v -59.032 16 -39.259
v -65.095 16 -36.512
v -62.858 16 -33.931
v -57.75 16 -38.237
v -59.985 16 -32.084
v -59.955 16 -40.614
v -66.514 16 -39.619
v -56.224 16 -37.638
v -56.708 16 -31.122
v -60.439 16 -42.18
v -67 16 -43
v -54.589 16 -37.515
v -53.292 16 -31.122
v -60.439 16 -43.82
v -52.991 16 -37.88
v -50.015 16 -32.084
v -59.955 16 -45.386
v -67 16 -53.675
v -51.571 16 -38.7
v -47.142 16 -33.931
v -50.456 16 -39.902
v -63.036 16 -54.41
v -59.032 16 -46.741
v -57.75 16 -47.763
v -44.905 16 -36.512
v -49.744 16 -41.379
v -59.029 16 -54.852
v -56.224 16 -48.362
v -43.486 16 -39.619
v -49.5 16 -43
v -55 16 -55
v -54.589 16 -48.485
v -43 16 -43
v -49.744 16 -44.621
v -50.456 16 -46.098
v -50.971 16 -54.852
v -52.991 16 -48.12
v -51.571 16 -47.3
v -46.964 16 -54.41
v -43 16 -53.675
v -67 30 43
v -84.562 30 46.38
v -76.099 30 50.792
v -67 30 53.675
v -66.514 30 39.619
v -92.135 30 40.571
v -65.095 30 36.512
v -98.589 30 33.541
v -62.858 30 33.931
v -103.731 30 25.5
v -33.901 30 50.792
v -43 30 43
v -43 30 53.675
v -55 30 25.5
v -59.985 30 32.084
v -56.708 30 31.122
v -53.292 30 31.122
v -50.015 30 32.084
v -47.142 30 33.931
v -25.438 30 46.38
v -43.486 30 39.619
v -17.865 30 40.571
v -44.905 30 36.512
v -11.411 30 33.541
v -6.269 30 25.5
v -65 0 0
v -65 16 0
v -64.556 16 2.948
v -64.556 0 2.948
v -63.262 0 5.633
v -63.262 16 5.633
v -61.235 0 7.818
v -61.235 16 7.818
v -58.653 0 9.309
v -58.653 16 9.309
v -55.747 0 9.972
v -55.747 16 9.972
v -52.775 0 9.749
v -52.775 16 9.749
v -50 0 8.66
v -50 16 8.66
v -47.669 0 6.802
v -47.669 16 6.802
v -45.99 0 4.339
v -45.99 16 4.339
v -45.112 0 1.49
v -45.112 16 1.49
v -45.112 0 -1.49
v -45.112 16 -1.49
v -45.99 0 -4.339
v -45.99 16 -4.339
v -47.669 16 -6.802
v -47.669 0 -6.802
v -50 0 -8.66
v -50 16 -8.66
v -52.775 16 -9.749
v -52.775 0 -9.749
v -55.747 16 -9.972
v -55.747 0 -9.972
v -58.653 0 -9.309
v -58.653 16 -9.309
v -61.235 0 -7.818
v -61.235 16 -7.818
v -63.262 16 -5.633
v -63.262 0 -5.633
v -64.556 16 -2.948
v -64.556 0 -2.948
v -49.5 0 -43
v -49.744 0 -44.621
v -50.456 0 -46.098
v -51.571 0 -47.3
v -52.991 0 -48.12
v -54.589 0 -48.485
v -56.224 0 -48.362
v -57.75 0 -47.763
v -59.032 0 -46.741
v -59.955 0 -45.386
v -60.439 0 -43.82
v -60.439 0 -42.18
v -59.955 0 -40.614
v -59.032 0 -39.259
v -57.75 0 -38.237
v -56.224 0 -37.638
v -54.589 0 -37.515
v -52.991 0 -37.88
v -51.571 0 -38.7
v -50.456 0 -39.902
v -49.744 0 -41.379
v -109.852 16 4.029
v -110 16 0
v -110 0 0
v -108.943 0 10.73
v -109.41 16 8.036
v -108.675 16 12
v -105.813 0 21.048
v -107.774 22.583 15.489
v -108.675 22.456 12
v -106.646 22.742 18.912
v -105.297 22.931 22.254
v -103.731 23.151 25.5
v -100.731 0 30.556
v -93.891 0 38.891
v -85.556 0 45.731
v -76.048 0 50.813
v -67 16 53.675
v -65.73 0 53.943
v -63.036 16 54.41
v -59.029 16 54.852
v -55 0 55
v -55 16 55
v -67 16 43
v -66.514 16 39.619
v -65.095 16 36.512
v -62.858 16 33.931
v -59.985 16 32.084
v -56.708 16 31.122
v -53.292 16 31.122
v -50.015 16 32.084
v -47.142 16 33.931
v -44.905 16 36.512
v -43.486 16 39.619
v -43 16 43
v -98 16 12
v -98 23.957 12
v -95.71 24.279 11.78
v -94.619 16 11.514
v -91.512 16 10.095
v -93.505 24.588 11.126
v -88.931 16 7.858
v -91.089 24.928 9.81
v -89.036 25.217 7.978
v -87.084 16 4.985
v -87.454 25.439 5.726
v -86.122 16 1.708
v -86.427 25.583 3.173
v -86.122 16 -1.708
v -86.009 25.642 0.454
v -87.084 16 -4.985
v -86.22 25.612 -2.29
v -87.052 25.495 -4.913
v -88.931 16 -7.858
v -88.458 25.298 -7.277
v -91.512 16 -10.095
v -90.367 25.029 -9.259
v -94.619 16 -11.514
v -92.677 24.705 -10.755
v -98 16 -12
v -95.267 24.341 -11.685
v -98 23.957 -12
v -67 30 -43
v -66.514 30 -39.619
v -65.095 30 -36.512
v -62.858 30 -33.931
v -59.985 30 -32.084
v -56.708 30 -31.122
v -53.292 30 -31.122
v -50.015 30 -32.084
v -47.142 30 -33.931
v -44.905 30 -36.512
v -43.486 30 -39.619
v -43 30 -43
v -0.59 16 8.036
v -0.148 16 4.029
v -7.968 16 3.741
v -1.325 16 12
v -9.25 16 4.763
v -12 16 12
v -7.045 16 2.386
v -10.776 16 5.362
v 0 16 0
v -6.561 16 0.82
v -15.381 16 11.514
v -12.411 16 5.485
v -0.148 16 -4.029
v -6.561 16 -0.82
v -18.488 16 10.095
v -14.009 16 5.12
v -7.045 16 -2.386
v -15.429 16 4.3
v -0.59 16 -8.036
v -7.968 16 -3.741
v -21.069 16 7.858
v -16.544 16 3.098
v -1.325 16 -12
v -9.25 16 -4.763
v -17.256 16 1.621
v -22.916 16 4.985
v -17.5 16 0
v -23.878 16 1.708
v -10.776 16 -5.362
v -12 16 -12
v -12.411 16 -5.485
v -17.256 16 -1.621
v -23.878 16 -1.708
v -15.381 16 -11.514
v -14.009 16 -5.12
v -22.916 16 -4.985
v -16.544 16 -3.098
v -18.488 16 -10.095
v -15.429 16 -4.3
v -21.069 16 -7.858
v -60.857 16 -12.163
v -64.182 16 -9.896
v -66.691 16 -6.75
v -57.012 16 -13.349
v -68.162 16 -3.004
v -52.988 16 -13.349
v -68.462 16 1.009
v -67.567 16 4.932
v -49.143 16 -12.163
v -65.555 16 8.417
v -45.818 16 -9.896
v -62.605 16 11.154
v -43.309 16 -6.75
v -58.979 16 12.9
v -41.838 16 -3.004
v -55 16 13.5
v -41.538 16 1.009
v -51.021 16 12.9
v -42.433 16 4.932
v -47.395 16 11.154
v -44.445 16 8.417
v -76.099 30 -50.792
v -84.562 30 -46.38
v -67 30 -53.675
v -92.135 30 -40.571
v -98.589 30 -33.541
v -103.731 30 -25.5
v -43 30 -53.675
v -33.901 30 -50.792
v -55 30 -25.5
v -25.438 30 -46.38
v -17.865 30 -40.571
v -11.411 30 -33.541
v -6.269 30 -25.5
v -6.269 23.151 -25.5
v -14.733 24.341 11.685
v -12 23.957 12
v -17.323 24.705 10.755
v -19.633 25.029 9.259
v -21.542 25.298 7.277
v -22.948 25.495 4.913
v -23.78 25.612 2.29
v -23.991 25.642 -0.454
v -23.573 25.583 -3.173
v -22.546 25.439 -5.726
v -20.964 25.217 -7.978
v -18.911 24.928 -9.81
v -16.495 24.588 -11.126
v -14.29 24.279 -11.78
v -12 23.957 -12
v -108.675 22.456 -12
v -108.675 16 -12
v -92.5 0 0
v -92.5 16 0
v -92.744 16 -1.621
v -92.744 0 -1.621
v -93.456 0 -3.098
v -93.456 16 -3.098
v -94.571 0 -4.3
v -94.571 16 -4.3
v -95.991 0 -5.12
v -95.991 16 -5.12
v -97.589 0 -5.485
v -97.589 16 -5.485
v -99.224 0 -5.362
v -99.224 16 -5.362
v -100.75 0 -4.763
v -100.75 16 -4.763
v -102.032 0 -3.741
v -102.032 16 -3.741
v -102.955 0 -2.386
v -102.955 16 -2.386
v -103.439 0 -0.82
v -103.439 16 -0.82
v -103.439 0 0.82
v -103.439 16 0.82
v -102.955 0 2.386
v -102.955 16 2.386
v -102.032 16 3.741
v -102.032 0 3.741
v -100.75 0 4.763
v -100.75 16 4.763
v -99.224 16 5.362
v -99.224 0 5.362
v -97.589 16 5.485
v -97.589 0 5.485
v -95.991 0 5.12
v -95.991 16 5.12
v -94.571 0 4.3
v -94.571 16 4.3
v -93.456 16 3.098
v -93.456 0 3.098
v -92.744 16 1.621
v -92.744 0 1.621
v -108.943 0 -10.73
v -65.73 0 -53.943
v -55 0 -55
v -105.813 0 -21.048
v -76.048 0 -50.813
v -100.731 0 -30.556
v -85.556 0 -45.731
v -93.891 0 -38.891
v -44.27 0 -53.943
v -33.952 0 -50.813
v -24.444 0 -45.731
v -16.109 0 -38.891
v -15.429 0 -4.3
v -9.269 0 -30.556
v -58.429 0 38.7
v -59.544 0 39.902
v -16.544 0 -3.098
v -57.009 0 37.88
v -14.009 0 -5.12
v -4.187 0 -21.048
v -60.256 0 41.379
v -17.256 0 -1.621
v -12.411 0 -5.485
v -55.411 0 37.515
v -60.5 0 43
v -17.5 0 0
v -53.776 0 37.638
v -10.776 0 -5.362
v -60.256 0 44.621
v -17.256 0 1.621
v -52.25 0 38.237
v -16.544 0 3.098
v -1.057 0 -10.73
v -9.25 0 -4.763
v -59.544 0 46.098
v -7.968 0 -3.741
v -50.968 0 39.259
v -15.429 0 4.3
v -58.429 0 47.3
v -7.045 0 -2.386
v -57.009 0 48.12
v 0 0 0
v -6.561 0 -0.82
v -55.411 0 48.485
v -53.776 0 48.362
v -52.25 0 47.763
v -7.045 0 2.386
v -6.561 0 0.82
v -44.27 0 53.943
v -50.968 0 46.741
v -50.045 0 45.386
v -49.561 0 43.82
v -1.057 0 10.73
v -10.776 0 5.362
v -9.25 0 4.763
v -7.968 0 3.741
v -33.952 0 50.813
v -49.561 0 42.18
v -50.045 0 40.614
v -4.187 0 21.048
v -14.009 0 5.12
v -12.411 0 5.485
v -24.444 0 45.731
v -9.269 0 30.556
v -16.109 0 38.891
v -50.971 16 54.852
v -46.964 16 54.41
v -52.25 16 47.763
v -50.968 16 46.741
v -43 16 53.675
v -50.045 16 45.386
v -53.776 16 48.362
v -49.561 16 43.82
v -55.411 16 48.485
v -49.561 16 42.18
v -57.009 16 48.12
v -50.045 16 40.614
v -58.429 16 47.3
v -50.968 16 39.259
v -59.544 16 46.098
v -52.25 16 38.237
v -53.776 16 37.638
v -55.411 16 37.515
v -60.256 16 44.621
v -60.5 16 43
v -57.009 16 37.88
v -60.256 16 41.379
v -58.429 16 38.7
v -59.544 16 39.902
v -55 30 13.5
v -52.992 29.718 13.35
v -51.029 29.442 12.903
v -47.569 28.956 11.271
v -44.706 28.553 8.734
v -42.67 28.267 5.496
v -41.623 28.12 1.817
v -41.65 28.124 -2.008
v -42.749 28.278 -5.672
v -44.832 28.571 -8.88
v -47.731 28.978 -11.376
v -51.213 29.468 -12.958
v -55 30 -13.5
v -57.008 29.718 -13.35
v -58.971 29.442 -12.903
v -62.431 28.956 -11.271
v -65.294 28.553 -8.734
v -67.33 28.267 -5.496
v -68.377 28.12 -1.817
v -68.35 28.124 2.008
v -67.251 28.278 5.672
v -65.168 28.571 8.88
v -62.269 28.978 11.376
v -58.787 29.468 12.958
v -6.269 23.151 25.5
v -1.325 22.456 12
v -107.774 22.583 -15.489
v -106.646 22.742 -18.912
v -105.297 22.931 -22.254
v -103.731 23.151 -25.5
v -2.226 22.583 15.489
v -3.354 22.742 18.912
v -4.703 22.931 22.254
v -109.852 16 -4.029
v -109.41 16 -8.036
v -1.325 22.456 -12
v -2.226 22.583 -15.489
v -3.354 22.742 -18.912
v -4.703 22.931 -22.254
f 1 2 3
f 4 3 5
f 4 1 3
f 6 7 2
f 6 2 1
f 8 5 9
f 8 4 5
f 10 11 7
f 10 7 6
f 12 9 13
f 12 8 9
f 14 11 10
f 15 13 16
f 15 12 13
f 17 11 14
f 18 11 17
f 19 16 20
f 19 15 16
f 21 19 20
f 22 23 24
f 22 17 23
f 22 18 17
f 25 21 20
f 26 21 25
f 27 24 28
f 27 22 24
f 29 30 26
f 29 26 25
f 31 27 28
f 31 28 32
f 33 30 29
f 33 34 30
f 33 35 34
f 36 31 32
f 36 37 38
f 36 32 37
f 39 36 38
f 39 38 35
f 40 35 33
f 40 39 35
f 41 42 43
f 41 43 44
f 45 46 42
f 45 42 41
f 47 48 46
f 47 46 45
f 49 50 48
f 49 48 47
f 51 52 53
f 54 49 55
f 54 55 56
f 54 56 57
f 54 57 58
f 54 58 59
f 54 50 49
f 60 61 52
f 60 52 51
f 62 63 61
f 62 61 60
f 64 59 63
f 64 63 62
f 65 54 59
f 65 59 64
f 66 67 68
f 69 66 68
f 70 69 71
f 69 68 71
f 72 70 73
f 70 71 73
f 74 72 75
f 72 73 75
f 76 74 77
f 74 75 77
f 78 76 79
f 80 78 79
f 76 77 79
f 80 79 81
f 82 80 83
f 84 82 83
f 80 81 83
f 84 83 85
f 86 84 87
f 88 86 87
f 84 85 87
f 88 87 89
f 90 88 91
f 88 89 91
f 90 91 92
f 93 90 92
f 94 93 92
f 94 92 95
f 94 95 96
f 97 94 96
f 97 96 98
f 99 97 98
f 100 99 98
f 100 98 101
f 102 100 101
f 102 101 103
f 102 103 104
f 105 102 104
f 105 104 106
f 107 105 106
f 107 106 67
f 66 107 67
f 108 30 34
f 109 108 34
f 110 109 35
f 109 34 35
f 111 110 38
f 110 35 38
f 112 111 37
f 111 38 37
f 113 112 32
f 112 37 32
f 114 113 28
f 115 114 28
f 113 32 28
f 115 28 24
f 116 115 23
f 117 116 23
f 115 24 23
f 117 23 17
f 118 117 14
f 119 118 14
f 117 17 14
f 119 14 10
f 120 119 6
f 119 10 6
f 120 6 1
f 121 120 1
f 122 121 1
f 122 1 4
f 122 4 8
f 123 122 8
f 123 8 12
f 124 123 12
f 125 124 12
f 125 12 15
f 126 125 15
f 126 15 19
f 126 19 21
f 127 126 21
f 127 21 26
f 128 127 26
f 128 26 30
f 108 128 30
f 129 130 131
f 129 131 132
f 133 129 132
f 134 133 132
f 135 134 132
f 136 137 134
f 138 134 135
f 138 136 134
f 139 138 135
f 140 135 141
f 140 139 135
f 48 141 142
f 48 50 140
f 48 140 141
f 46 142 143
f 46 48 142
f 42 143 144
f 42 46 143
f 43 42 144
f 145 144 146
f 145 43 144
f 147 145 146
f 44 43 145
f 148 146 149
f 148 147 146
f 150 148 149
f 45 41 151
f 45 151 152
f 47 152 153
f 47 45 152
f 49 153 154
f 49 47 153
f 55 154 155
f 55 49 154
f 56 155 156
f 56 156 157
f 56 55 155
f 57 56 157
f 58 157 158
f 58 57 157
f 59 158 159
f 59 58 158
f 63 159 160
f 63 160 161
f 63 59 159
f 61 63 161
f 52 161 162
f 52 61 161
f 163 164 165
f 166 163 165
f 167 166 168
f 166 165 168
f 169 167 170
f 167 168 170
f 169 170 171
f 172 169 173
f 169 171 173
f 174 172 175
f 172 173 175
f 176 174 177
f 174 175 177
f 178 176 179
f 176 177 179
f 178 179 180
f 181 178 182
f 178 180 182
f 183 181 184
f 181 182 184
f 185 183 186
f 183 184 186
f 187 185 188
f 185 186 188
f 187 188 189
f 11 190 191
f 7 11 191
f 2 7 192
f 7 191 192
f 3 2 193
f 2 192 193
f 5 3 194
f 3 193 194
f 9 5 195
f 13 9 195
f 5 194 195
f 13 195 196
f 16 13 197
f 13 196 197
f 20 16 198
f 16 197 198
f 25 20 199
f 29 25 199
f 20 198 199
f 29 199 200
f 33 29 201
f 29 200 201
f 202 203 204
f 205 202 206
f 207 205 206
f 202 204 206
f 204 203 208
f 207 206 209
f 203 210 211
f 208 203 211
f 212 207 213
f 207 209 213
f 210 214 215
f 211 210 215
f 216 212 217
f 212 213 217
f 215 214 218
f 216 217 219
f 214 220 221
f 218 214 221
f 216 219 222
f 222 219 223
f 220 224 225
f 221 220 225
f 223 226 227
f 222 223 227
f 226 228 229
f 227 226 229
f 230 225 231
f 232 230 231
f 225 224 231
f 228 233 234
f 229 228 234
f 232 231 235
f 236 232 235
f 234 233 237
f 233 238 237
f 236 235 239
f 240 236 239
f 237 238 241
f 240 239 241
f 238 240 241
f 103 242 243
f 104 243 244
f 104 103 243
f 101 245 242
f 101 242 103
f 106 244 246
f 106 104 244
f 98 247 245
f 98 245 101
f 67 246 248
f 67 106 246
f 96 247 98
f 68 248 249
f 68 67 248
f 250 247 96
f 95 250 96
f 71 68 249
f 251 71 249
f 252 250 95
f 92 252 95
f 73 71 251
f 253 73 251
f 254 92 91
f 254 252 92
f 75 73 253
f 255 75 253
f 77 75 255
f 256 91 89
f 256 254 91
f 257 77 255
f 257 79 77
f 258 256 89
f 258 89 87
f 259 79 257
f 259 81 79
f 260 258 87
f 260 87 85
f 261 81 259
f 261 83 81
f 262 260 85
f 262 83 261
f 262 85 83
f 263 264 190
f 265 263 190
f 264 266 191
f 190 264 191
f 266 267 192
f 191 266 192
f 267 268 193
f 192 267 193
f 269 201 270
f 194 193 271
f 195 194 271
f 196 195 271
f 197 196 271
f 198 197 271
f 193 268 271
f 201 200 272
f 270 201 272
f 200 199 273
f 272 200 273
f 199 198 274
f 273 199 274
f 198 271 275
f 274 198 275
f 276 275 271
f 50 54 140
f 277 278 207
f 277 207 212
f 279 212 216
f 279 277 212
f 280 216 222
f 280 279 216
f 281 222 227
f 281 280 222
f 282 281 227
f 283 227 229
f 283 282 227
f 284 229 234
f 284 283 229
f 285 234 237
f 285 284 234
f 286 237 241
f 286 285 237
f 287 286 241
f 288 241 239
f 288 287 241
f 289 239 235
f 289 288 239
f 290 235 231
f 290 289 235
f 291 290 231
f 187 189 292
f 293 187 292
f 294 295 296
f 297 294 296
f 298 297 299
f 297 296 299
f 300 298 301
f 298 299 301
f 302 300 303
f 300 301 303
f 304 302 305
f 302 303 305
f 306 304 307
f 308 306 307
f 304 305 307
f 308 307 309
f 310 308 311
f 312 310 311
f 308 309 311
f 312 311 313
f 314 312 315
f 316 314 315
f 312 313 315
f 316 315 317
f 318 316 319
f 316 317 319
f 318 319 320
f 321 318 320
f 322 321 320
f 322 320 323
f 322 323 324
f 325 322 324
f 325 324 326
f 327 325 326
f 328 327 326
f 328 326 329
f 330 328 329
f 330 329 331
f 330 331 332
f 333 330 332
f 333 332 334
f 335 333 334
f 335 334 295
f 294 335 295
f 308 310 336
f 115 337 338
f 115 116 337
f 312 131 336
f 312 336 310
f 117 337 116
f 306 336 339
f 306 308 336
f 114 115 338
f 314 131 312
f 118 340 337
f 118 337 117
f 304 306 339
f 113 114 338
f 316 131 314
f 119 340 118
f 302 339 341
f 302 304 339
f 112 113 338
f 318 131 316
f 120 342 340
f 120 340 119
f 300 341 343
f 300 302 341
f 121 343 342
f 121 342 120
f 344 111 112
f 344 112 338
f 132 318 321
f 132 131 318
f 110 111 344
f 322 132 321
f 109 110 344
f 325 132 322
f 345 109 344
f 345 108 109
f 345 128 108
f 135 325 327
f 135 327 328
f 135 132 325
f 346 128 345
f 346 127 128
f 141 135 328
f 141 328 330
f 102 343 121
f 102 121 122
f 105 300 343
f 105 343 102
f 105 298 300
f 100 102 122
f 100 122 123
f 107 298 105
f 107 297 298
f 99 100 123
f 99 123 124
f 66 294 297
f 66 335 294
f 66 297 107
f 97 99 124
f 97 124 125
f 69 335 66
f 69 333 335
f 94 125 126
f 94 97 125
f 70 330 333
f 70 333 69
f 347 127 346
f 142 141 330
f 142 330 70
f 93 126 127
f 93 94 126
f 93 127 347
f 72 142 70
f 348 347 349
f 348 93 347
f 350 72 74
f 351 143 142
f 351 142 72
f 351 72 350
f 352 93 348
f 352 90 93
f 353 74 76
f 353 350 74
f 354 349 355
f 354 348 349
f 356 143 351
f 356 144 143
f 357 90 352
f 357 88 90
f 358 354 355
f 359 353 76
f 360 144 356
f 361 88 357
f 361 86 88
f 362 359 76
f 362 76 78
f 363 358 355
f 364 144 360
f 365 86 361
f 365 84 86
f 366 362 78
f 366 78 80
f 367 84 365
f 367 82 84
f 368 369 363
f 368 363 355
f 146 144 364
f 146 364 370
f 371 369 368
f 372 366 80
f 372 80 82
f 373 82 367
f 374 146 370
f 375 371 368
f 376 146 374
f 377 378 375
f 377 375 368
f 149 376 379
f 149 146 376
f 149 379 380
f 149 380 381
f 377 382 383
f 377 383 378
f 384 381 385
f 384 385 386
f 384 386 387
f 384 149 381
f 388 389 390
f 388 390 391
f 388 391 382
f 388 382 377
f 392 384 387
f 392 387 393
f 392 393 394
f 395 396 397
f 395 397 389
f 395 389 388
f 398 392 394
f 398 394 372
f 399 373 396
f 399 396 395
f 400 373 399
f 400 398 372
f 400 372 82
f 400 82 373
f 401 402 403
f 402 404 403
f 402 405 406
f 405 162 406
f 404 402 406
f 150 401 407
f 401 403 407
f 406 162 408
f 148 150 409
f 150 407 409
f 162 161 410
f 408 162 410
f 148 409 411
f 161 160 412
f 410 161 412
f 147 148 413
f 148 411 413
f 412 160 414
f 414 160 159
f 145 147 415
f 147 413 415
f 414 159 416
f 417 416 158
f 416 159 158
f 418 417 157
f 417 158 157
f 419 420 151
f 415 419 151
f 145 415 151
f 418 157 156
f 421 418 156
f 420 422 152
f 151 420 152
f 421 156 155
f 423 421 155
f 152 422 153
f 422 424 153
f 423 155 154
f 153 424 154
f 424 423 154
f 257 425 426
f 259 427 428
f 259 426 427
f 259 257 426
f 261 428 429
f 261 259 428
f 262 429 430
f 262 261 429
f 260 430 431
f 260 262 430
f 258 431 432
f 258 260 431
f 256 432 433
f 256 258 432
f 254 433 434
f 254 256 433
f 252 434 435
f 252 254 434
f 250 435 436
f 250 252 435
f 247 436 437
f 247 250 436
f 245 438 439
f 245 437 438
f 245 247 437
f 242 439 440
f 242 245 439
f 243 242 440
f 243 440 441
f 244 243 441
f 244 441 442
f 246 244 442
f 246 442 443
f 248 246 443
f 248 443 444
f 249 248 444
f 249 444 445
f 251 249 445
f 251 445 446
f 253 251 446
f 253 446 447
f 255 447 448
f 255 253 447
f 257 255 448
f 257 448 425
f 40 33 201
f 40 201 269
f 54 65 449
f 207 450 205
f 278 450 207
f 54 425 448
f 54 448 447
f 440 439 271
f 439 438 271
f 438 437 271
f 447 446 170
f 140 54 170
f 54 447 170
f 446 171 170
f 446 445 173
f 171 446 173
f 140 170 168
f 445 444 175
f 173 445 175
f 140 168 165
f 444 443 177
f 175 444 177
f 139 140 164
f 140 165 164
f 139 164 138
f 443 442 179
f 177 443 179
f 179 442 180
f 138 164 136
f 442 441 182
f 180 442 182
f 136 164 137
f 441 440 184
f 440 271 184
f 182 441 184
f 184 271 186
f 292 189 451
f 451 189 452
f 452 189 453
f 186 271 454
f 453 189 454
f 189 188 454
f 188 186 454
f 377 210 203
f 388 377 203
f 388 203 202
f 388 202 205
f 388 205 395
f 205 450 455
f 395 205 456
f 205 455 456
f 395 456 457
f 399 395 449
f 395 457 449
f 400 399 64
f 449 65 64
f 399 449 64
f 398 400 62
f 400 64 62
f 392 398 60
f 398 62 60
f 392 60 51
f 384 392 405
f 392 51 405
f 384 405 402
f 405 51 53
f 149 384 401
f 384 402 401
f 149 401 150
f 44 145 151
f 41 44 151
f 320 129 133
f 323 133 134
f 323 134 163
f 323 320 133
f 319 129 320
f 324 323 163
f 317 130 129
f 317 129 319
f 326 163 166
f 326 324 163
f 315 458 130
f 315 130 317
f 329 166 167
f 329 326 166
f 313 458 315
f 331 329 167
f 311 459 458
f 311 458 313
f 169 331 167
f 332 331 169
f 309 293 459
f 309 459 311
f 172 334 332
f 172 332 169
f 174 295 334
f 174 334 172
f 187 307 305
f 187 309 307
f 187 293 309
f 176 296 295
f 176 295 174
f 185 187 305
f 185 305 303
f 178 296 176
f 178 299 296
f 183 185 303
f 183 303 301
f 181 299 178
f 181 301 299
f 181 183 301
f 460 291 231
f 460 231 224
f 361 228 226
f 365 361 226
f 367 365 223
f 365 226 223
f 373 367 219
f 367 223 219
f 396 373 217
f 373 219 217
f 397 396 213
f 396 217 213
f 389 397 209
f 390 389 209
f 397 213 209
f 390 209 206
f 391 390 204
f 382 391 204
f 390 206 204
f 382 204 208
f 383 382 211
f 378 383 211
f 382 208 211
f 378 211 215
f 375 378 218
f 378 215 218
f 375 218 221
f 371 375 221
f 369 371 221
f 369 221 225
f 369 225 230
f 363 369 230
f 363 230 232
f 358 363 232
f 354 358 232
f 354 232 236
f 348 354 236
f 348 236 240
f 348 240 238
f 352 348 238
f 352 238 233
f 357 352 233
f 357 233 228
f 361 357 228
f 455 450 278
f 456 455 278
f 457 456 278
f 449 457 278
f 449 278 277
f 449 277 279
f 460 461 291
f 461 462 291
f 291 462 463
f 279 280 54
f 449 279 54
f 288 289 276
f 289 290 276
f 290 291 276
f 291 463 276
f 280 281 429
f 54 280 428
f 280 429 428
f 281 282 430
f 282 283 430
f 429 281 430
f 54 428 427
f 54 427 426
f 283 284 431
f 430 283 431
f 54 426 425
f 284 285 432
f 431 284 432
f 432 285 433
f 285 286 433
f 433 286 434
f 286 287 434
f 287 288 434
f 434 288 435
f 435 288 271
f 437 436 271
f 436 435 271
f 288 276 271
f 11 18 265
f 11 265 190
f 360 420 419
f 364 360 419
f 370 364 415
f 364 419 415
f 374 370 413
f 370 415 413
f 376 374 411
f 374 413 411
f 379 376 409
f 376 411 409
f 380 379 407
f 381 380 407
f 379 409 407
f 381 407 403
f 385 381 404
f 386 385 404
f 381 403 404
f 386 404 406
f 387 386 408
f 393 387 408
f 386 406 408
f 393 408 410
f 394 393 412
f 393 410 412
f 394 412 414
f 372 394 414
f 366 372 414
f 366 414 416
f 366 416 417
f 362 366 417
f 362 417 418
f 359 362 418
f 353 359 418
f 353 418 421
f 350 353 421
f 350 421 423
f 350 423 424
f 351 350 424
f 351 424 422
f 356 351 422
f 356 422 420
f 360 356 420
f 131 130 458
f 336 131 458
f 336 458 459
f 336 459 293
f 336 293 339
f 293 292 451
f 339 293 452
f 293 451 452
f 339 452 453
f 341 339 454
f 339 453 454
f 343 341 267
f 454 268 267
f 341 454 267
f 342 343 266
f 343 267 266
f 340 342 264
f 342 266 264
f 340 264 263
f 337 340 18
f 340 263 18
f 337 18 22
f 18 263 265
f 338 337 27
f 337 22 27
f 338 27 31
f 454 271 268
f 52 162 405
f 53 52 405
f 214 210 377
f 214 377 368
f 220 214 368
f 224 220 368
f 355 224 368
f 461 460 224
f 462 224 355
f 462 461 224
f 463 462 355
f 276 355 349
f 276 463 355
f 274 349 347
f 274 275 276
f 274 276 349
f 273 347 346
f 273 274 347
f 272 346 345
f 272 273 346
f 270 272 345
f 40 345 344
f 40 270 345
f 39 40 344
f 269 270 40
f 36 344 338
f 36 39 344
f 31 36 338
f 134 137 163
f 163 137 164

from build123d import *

# Parameters (mm, degrees)
SCHIZZO3_W                   = 110
SCHIZZO3_H                   = 30
ESTRUSIONE_ESTRUSIONE2_DEPTH = 55
RACCORDO1_R                  = 55
TAGLIO_ESTRUSIONE1_DEPTH     = 25.5
RACCORDO1_OF_SPECCHIA1_R     = 55
TAGLIO_ESTRUSIONE2_DEPTH     = 14
SCHIZZO9_R                   = 5.5
TAGLIO_ESTRUSIONE3_DEPTH     = 125.020159652
SCHIZZO10_R                  = 13.5
TAGLIO_ESTRUSIONE5_DEPTH     = 125.020159652
SCHIZZO11_R                  = 10
TAGLIO_ESTRUSIONE6_DEPTH     = 125.020159652


with BuildPart() as part:
    # Schizzo3 → Estrusione-Estrusione2 (new body)
    with BuildSketch(Plane.XY):
        with Locations((-55, 15)):
            Rectangle(SCHIZZO3_W, SCHIZZO3_H)
    estrusione_estrusione2 = extrude(amount=ESTRUSIONE_ESTRUSIONE2_DEPTH)

    # Raccordo1
    raccordo1_edges = [part.edges().sort_by_distance(p)[0] for p in [
        (-110, 15, 55),
        (0, 15, 55),
    ]]
    fillet(raccordo1_edges, radius=RACCORDO1_R - 0.0001)  # a hair under: the kernel refuses the full size

    # Schizzo6 → Taglio-Estrusione1 (cut)
    with BuildSketch(Plane(origin=(0, 0, 0), x_dir=(-1, 0, 0), z_dir=(0, 0, -1))):
        Polygon((0, 22.270254091), (55, 30), (0, 30), align=None)
        Polygon((110, 30), (55, 30), (110, 22.270254091), align=None)
    taglio_estrusione1 = extrude(amount=-TAGLIO_ESTRUSIONE1_DEPTH, mode=Mode.SUBTRACT)

    # Specchia1: Estrusione-Estrusione2, Taglio-Estrusione1 across plane
    add(estrusione_estrusione2.mirror(Plane.XY))
    add(taglio_estrusione1.mirror(Plane.XY), mode=Mode.SUBTRACT)

    # Raccordo1 of Specchia1
    raccordo1_of_specchia1_edges = [part.edges().sort_by_distance(p)[0] for p in [
        (-110, 15, -55),
        (0, 15, -55),
    ]]
    fillet(raccordo1_of_specchia1_edges, radius=RACCORDO1_OF_SPECCHIA1_R - 0.0001)  # a hair under: the kernel refuses the full size

    # Schizzo8 → Taglio-Estrusione2 (cut)
    with BuildSketch(Plane(origin=(0, 30, 0), x_dir=(1, 0, 0), z_dir=(0, 1, 0))):
        with BuildLine():
            Line((-43, -55), (-67, -55))
            Line((-67, -55), (-67, -43))
            ThreePointArc((-67, -43), (-55, -31), (-43, -43))
            Line((-43, -43), (-43, -55))
        make_face()
        with BuildLine():
            Line((-67, 55), (-67, 43))
            ThreePointArc((-67, 43), (-55, 31), (-43, 43))
            Line((-43, 43), (-43, 55))
            Line((-43, 55), (-67, 55))
        make_face()
        with BuildLine():
            Line((0, 12), (0, -12))
            Line((0, -12), (-12, -12))
            ThreePointArc((-12, -12), (-24, 0), (-12, 12))
            Line((-12, 12), (0, 12))
        make_face()
        with BuildLine():
            Line((-110, -12), (-98, -12))
            ThreePointArc((-98, -12), (-86, 0), (-98, 12))
            Line((-98, 12), (-110, 12))
            Line((-110, 12), (-110, -12))
        make_face()
    extrude(amount=-TAGLIO_ESTRUSIONE2_DEPTH, mode=Mode.SUBTRACT)

    # Schizzo9 → Taglio-Estrusione3 (cut, through all)
    with BuildSketch(Plane(origin=(0, 16, 0), x_dir=(1, 0, 0), z_dir=(0, 1, 0))):
        with Locations(Location((-12, 0, 0), (0, 0, 180))):
            Circle(SCHIZZO9_R)
        with Locations((-98, 0)):
            Circle(SCHIZZO9_R)
        with Locations(Location((-55, -43, 0), (0, 0, 180))):
            Circle(SCHIZZO9_R)
        with Locations((-55, 43)):
            Circle(SCHIZZO9_R)
    extrude(amount=-TAGLIO_ESTRUSIONE3_DEPTH, mode=Mode.SUBTRACT)

    # Schizzo10 → Taglio-Estrusione5 (cut, through all)
    with BuildSketch(Plane(origin=(0, 16, 0), x_dir=(1, 0, 0), z_dir=(0, 1, 0))):
        with Locations(Location((-55, 0, 0), (0, 0, 270))):
            Circle(SCHIZZO10_R)
    extrude(amount=TAGLIO_ESTRUSIONE5_DEPTH, mode=Mode.SUBTRACT)

    # Schizzo11 → Taglio-Estrusione6 (cut, through all)
    with BuildSketch(Plane(origin=(0, 16, 0), x_dir=(1, 0, 0), z_dir=(0, 1, 0))):
        with Locations(Location((-55, 0, 0), (0, 0, 180))):
            Circle(SCHIZZO11_R)
    extrude(amount=-TAGLIO_ESTRUSIONE6_DEPTH, mode=Mode.SUBTRACT)


solid = part.part
